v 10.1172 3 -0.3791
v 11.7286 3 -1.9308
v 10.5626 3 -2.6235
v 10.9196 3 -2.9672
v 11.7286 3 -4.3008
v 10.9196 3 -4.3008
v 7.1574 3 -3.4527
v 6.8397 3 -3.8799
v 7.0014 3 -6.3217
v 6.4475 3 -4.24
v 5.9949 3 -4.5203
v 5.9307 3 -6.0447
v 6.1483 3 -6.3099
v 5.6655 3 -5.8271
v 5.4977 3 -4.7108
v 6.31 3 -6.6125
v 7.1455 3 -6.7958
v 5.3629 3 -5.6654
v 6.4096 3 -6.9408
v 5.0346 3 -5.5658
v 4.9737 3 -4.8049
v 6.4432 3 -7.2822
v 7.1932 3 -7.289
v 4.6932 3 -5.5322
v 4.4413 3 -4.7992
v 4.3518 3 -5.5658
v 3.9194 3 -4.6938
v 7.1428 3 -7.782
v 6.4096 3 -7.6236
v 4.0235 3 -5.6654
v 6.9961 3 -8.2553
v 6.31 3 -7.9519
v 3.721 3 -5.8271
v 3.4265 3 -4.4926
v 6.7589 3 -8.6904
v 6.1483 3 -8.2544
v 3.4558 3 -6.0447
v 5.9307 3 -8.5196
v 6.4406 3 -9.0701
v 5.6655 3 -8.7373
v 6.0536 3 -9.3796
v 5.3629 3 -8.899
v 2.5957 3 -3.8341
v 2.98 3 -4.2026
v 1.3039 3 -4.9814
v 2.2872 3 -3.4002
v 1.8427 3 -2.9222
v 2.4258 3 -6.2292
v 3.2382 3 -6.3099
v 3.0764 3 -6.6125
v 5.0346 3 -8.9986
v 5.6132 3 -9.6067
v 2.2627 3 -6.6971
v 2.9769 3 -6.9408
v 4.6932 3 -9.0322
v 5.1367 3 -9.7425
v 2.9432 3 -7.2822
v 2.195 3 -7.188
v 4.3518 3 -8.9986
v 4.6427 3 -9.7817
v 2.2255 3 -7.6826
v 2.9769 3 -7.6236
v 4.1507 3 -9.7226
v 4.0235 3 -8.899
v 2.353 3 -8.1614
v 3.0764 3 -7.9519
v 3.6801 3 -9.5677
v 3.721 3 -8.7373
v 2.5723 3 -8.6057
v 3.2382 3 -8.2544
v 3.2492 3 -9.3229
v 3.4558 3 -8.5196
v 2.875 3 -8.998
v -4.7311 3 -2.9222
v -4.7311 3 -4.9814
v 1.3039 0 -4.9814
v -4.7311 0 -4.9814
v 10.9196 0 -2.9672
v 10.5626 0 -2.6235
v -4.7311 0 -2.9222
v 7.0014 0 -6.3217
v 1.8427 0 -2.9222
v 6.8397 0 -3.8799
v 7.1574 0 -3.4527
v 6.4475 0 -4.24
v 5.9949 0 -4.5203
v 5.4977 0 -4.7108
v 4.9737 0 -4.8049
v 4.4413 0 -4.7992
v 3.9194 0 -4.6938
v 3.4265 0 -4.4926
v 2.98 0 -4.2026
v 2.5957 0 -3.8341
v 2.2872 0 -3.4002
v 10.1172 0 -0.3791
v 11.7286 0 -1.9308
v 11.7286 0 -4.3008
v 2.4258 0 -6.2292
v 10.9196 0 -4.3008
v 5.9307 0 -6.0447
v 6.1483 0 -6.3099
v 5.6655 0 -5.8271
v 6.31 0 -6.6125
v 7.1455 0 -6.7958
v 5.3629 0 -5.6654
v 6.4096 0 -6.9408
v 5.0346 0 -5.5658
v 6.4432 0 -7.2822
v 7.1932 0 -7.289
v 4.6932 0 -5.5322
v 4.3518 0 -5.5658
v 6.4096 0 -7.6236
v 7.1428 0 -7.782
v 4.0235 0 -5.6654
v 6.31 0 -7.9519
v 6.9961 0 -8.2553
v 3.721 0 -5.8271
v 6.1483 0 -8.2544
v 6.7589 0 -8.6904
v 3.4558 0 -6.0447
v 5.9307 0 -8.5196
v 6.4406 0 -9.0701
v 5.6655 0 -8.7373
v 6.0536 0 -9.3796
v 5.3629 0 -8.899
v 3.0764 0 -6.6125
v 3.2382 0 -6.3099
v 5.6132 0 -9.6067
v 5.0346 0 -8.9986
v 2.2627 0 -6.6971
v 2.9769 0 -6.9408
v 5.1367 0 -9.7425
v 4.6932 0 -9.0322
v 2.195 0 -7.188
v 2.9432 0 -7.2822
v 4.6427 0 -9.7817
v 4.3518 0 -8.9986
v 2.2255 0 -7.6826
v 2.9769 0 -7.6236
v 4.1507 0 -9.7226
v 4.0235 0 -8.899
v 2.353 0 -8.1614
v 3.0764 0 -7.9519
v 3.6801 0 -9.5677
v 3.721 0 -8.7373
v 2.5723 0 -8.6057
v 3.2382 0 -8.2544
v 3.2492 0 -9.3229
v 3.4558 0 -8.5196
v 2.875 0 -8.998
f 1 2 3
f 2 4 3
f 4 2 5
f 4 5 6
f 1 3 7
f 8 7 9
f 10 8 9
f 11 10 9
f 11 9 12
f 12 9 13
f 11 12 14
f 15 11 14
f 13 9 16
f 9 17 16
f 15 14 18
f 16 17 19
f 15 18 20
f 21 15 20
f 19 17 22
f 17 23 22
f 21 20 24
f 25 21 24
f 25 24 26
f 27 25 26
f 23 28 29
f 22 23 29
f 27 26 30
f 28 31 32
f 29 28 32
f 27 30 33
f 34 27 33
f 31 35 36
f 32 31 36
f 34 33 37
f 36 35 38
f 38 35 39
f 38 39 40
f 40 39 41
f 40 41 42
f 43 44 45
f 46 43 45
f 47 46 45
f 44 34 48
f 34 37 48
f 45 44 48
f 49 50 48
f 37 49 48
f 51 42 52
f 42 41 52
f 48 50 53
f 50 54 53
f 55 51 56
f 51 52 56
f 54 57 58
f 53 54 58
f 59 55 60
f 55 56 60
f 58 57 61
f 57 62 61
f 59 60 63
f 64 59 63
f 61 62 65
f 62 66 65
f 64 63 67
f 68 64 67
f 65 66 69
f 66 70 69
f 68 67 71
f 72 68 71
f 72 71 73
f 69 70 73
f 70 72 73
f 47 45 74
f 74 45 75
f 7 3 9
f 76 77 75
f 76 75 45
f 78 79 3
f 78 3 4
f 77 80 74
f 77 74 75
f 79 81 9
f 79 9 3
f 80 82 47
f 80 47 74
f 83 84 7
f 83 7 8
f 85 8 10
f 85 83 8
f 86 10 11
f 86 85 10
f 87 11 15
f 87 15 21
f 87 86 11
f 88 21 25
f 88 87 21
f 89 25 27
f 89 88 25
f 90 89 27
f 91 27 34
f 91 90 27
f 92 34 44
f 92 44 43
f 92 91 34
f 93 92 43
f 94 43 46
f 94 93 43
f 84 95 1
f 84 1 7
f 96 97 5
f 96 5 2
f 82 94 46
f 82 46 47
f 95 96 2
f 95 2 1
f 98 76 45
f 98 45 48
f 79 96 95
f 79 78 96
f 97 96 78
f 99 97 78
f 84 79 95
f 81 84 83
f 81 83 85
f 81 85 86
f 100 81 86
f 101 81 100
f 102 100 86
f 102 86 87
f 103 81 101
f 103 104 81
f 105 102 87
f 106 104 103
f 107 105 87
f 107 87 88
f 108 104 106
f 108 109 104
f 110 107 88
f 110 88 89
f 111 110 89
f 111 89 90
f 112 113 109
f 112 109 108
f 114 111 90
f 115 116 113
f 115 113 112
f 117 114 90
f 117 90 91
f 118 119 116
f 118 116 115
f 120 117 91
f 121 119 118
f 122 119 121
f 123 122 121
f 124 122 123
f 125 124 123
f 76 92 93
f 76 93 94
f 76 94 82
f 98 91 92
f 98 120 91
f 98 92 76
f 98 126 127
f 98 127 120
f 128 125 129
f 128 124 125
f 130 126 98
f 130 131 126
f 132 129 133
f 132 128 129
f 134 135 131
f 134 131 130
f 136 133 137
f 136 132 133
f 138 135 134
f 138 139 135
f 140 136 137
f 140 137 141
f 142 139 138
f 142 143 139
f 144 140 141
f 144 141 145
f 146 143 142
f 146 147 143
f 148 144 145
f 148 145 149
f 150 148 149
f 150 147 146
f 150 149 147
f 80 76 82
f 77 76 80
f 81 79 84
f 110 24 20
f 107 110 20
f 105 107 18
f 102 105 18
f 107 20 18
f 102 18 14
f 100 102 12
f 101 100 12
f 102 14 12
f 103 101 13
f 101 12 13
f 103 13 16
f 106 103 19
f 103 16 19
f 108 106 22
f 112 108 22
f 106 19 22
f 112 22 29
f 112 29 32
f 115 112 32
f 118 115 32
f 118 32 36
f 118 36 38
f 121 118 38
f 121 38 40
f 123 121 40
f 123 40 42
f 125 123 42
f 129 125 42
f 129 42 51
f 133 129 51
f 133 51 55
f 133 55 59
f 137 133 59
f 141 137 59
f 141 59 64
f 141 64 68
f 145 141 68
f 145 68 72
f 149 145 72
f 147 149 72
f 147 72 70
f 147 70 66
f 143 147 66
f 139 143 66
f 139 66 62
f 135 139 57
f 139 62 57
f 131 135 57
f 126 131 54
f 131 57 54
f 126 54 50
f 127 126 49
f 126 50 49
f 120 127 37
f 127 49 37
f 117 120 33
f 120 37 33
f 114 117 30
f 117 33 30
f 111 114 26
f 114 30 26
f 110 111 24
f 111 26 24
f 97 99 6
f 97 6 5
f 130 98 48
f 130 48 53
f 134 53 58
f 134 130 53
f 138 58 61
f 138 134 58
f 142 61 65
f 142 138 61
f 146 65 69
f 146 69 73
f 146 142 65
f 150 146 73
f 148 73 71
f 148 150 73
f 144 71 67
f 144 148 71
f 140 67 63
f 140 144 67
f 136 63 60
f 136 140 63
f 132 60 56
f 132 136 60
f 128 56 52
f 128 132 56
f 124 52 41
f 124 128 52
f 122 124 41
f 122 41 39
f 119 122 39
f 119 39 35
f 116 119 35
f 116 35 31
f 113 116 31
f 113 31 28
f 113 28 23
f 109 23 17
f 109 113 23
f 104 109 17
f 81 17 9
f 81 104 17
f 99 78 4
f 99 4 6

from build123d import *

# Parameters (mm, degrees)
EXTRUDE_1_DEPTH     = 3
SKETCH_3_R          = 1.75
CUT_EXTRUDE_1_DEPTH = 10


with BuildPart() as part:
    # Эскиз1 → Бобышка-Вытянуть1 (new body)
    with BuildSketch(Plane(origin=(0, 0, 0), x_dir=(1, 0, 0), z_dir=(0, 1, 0))):
        with BuildLine():
            Line((1.303877519, 4.981364115), (2.425804873, 6.229215237))
            ThreePointArc((2.425804873, 6.229215237), (4.642715437, 9.781674692), (7.001370076, 6.321702305))
            Line((7.001370076, 6.321702305), (10.562616141, 2.623485237))
            Line((10.562616141, 2.623485237), (10.919592499, 2.967240249))
            Line((10.919592499, 2.967240249), (10.919592499, 4.300759927))
            Line((10.919592499, 4.300759927), (11.728649514, 4.300759927))
            Line((11.728649514, 4.300759927), (11.728649514, 3.252739503))
            Line((11.728649514, 3.252739503), (11.728649514, 1.930836158))
            Line((11.728649514, 1.930836158), (10.117222577, 0.3790917))
            Line((10.117222577, 0.3790917), (7.157448349, 3.452703399))
            ThreePointArc((7.157448349, 3.452703399), (4.707383461, 4.814595243), (2.287238645, 3.400216789))
            Line((2.287238645, 3.400216789), (1.842702366, 2.922219258))
            Line((1.842702366, 2.922219258), (-0.547473895, 2.922219258))
            Line((-0.547473895, 2.922219258), (-4.731054927, 2.922219258))
            Line((-4.731054927, 2.922219258), (-4.731054927, 4.981364115))
            Line((-4.731054927, 4.981364115), (1.303877519, 4.981364115))
        make_face()
    extrude(amount=EXTRUDE_1_DEPTH)

    # Эскиз3 → Вырез-Вытянуть1 (cut)
    with BuildSketch(Plane(origin=(0, 3, 0), x_dir=(1, 0, 0), z_dir=(0, 1, 0))):
        with Locations(Location((4.693238255, 7.282185255, 0), (0, 0, 270))):
            Circle(SKETCH_3_R)
    extrude(amount=-CUT_EXTRUDE_1_DEPTH, mode=Mode.SUBTRACT)


solid = part.part
